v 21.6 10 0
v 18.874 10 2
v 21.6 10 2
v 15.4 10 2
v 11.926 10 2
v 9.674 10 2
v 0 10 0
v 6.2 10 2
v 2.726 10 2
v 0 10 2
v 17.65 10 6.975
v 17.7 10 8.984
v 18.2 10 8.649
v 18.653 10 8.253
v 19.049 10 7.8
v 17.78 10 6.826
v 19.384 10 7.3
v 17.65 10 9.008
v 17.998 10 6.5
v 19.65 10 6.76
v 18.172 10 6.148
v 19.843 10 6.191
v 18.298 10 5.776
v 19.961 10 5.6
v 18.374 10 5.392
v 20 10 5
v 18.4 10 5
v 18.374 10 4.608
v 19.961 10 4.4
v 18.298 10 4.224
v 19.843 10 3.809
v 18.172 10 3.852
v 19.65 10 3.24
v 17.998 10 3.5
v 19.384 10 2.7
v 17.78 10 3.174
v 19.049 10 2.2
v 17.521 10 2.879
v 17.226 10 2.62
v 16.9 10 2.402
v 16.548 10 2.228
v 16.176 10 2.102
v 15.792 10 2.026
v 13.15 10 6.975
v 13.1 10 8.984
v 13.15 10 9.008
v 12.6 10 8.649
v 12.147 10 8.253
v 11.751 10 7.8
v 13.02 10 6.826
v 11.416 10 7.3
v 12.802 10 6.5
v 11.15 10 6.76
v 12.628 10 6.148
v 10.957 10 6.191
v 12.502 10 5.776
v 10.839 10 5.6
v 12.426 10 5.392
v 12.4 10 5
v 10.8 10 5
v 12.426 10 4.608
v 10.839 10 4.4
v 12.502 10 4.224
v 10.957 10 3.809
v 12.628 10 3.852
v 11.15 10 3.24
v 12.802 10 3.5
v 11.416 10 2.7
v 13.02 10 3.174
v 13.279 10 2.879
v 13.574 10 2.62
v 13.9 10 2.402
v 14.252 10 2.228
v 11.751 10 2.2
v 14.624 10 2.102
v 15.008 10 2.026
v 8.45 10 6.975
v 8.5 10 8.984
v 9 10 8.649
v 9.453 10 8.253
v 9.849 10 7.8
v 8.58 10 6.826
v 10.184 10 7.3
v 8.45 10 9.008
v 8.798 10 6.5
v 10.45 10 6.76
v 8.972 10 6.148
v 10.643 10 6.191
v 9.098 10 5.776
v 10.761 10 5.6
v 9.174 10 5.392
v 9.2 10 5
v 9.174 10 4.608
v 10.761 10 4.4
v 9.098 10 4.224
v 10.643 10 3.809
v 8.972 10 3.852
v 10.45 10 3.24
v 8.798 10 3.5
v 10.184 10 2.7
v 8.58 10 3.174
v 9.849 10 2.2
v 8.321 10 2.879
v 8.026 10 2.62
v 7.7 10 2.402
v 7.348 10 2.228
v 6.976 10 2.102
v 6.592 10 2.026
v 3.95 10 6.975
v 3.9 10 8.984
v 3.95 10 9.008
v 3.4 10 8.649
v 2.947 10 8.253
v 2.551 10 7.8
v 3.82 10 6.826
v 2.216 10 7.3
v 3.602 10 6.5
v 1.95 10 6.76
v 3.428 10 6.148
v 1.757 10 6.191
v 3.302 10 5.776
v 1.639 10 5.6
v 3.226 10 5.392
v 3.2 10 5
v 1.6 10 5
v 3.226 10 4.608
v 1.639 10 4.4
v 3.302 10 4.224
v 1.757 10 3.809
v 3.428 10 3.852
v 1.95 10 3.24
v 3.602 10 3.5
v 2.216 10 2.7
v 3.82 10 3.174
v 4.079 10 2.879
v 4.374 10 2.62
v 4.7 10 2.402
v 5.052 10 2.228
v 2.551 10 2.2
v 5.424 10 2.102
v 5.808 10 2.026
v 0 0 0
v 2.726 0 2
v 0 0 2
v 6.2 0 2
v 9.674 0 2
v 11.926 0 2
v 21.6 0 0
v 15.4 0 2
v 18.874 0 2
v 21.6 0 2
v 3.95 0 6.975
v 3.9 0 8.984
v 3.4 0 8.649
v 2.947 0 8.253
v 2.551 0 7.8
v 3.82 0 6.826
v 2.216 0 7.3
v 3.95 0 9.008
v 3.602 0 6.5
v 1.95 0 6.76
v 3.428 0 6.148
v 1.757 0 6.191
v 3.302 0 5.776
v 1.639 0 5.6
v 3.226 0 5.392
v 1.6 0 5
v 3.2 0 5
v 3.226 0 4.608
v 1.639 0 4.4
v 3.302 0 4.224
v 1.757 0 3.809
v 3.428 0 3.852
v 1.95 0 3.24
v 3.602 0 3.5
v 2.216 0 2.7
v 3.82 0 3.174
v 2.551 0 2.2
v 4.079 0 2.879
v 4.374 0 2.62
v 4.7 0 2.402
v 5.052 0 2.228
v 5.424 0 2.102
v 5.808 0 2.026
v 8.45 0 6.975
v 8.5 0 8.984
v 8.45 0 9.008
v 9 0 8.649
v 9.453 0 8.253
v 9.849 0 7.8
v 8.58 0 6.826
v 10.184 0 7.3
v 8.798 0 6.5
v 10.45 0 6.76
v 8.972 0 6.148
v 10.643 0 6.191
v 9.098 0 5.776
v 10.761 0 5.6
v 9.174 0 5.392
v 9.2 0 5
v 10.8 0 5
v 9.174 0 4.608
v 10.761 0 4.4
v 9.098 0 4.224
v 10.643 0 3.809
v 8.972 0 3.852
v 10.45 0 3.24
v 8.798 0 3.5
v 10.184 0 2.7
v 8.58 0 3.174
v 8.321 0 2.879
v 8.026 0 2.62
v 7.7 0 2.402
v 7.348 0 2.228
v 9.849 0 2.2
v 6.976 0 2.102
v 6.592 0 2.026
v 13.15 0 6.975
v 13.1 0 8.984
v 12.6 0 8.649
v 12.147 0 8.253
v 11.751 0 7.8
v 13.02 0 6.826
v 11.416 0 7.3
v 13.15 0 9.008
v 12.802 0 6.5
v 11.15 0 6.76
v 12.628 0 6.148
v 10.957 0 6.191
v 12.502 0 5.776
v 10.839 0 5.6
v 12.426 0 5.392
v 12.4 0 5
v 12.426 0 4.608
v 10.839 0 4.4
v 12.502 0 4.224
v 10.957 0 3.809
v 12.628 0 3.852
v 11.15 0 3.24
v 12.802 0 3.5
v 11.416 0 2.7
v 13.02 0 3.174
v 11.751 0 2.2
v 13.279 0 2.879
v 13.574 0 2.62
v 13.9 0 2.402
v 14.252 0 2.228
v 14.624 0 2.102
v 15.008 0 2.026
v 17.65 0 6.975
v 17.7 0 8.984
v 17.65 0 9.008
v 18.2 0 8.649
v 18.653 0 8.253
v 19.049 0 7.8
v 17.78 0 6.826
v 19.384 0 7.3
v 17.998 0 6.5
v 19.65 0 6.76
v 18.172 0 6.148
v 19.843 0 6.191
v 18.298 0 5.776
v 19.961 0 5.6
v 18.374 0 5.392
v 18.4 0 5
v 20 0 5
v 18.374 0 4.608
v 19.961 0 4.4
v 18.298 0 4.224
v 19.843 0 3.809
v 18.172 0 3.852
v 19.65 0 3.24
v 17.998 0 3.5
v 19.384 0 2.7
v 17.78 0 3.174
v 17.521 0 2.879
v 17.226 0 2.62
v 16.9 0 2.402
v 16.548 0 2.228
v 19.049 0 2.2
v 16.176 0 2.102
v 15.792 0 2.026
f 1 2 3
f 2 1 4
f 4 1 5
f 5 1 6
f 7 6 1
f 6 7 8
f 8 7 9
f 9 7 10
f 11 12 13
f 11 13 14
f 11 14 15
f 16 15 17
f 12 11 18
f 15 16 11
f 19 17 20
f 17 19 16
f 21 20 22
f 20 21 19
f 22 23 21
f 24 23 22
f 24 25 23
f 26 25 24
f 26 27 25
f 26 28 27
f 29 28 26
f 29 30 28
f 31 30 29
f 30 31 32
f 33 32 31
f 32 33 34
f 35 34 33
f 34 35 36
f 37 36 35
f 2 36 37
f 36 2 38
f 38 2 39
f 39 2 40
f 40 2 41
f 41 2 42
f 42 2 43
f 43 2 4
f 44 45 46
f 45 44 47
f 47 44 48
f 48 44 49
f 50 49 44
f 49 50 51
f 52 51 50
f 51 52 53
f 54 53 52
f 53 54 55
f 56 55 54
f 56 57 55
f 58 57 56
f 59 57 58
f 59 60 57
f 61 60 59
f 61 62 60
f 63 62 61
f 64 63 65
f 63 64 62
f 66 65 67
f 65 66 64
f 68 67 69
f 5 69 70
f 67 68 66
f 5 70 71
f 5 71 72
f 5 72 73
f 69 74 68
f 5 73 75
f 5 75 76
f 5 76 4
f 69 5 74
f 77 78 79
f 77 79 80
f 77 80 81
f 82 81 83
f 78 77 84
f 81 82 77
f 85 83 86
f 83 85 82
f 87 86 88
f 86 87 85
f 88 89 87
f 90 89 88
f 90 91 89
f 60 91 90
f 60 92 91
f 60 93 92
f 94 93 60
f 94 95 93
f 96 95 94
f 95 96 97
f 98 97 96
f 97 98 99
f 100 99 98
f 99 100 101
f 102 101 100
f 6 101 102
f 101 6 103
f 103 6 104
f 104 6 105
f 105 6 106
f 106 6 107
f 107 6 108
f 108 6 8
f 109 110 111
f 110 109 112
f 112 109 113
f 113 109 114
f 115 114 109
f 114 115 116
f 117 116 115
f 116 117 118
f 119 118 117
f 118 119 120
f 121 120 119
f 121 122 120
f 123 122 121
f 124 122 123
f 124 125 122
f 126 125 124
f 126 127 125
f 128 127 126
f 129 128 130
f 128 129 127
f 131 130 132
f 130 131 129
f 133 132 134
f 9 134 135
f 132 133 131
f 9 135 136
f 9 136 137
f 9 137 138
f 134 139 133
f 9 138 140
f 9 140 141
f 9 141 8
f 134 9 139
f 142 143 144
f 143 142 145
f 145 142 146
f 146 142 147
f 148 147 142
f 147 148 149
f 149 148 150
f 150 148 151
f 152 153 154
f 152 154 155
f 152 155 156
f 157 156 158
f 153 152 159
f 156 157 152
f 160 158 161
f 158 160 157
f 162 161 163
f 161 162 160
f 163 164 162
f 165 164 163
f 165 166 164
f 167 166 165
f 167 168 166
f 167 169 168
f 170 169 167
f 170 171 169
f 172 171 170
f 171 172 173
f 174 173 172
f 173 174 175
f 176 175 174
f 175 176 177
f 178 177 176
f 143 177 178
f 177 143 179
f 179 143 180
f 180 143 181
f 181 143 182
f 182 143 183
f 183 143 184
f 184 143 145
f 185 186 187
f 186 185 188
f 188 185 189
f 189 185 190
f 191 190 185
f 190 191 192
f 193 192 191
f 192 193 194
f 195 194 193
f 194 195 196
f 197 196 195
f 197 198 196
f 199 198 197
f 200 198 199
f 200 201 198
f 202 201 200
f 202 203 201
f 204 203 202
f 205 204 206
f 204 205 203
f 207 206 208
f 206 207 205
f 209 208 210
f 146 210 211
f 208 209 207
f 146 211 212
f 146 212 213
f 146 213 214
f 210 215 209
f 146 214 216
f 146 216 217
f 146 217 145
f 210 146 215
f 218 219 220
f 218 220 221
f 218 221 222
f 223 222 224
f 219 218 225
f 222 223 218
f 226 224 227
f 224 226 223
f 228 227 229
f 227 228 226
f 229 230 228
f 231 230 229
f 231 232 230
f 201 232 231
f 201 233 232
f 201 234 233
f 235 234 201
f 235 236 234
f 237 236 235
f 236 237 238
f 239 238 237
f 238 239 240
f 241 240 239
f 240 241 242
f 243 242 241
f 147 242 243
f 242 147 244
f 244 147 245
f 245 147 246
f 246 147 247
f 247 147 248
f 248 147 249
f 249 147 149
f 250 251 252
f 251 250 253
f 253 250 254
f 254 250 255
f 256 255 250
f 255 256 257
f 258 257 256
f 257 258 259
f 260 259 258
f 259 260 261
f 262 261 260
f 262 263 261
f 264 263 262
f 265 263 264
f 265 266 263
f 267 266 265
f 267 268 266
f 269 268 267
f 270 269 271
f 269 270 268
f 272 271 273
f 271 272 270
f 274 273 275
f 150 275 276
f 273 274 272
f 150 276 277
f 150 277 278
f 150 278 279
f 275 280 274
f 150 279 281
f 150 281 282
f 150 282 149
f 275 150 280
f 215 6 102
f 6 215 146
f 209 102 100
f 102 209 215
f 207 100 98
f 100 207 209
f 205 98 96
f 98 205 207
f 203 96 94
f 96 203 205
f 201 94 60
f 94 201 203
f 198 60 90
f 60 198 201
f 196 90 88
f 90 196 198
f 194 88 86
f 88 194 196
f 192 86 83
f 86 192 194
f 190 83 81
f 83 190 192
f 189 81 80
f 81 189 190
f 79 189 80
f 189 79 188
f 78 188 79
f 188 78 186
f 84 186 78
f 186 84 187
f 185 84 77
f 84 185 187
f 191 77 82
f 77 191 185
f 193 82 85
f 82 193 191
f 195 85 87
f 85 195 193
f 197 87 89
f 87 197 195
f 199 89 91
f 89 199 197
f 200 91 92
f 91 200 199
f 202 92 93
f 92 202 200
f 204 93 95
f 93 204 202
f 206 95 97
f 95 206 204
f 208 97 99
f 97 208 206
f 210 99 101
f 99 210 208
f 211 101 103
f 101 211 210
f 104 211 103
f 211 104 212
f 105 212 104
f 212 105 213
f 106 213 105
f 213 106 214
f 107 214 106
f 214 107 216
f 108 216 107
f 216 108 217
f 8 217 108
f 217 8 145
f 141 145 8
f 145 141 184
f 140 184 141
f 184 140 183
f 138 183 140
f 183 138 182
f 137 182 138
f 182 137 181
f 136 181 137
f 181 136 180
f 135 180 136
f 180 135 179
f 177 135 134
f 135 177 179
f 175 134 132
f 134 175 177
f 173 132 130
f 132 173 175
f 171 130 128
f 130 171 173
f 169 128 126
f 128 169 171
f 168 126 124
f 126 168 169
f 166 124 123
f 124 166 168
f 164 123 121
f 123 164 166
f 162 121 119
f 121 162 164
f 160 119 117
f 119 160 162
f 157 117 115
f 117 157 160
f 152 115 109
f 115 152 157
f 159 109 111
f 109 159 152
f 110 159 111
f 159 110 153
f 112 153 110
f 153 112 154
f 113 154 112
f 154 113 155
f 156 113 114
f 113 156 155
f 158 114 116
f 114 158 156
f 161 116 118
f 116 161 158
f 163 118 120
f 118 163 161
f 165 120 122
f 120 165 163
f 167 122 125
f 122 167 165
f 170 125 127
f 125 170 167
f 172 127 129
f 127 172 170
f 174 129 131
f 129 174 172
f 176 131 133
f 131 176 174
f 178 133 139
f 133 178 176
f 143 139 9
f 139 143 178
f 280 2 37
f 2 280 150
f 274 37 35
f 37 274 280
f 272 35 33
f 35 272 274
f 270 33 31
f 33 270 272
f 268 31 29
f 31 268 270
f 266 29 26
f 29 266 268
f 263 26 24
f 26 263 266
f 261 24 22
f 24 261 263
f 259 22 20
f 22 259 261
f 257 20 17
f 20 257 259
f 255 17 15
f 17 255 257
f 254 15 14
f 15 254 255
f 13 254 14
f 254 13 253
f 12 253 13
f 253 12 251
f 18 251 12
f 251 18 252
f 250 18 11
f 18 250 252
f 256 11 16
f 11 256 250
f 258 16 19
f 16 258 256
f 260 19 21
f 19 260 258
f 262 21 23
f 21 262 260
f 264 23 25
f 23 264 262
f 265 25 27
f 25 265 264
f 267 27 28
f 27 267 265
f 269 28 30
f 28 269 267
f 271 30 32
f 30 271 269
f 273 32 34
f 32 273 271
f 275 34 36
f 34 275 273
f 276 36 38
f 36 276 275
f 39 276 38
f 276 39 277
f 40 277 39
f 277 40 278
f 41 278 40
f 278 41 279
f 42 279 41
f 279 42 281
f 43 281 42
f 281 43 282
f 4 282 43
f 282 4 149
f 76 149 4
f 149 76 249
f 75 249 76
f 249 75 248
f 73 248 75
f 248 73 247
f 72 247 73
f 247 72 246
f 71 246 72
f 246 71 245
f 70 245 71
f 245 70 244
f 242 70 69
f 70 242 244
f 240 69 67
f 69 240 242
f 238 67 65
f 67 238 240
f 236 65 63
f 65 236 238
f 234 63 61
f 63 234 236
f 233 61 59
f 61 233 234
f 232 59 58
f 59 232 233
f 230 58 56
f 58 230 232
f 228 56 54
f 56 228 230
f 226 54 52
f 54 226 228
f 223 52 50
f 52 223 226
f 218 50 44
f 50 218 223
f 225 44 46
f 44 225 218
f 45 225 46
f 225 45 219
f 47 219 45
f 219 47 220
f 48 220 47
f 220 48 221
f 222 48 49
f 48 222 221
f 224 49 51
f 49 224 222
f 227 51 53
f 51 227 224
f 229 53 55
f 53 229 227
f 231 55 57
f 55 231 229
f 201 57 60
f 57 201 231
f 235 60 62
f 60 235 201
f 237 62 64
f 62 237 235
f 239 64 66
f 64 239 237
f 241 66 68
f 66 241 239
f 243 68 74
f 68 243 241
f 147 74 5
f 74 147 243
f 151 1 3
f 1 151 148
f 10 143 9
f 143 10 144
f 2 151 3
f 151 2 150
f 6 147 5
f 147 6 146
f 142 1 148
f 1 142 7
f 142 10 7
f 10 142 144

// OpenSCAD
// Cable clip
// Snap-in cable holders on a flat base for an adhesive pad.

/* [Clip] */
// Cable diameter (mm)
cable_diameter = 6; // [2:0.5:15]
// Number of cables
cable_count = 2; // [1:1:6]
// Clip width along the cable (mm)
clip_width = 10; // [5:1:30]
// Base thickness (mm)
base_thickness = 2; // [1:0.2:5]

/* [Hidden] */
wall = 1.6;
opening = 0.75;
$fn = 48;

pitch = cable_diameter + 2 * wall;

module ring() {
  difference() {
    circle(d = cable_diameter + 2 * wall);
    circle(d = cable_diameter);
    translate([-cable_diameter * opening / 2, 0]) square([cable_diameter * opening, cable_diameter]);
  }
}

module clips() {
  for (i = [0:cable_count - 1])
    translate([wall + pitch / 2 + i * pitch, clip_width, base_thickness + cable_diameter / 2])
      rotate([90, 0, 0]) linear_extrude(height = clip_width) ring();
}

module base() {
  cube([cable_count * pitch + 2 * wall, clip_width, base_thickness]);
}

base();
clips();
